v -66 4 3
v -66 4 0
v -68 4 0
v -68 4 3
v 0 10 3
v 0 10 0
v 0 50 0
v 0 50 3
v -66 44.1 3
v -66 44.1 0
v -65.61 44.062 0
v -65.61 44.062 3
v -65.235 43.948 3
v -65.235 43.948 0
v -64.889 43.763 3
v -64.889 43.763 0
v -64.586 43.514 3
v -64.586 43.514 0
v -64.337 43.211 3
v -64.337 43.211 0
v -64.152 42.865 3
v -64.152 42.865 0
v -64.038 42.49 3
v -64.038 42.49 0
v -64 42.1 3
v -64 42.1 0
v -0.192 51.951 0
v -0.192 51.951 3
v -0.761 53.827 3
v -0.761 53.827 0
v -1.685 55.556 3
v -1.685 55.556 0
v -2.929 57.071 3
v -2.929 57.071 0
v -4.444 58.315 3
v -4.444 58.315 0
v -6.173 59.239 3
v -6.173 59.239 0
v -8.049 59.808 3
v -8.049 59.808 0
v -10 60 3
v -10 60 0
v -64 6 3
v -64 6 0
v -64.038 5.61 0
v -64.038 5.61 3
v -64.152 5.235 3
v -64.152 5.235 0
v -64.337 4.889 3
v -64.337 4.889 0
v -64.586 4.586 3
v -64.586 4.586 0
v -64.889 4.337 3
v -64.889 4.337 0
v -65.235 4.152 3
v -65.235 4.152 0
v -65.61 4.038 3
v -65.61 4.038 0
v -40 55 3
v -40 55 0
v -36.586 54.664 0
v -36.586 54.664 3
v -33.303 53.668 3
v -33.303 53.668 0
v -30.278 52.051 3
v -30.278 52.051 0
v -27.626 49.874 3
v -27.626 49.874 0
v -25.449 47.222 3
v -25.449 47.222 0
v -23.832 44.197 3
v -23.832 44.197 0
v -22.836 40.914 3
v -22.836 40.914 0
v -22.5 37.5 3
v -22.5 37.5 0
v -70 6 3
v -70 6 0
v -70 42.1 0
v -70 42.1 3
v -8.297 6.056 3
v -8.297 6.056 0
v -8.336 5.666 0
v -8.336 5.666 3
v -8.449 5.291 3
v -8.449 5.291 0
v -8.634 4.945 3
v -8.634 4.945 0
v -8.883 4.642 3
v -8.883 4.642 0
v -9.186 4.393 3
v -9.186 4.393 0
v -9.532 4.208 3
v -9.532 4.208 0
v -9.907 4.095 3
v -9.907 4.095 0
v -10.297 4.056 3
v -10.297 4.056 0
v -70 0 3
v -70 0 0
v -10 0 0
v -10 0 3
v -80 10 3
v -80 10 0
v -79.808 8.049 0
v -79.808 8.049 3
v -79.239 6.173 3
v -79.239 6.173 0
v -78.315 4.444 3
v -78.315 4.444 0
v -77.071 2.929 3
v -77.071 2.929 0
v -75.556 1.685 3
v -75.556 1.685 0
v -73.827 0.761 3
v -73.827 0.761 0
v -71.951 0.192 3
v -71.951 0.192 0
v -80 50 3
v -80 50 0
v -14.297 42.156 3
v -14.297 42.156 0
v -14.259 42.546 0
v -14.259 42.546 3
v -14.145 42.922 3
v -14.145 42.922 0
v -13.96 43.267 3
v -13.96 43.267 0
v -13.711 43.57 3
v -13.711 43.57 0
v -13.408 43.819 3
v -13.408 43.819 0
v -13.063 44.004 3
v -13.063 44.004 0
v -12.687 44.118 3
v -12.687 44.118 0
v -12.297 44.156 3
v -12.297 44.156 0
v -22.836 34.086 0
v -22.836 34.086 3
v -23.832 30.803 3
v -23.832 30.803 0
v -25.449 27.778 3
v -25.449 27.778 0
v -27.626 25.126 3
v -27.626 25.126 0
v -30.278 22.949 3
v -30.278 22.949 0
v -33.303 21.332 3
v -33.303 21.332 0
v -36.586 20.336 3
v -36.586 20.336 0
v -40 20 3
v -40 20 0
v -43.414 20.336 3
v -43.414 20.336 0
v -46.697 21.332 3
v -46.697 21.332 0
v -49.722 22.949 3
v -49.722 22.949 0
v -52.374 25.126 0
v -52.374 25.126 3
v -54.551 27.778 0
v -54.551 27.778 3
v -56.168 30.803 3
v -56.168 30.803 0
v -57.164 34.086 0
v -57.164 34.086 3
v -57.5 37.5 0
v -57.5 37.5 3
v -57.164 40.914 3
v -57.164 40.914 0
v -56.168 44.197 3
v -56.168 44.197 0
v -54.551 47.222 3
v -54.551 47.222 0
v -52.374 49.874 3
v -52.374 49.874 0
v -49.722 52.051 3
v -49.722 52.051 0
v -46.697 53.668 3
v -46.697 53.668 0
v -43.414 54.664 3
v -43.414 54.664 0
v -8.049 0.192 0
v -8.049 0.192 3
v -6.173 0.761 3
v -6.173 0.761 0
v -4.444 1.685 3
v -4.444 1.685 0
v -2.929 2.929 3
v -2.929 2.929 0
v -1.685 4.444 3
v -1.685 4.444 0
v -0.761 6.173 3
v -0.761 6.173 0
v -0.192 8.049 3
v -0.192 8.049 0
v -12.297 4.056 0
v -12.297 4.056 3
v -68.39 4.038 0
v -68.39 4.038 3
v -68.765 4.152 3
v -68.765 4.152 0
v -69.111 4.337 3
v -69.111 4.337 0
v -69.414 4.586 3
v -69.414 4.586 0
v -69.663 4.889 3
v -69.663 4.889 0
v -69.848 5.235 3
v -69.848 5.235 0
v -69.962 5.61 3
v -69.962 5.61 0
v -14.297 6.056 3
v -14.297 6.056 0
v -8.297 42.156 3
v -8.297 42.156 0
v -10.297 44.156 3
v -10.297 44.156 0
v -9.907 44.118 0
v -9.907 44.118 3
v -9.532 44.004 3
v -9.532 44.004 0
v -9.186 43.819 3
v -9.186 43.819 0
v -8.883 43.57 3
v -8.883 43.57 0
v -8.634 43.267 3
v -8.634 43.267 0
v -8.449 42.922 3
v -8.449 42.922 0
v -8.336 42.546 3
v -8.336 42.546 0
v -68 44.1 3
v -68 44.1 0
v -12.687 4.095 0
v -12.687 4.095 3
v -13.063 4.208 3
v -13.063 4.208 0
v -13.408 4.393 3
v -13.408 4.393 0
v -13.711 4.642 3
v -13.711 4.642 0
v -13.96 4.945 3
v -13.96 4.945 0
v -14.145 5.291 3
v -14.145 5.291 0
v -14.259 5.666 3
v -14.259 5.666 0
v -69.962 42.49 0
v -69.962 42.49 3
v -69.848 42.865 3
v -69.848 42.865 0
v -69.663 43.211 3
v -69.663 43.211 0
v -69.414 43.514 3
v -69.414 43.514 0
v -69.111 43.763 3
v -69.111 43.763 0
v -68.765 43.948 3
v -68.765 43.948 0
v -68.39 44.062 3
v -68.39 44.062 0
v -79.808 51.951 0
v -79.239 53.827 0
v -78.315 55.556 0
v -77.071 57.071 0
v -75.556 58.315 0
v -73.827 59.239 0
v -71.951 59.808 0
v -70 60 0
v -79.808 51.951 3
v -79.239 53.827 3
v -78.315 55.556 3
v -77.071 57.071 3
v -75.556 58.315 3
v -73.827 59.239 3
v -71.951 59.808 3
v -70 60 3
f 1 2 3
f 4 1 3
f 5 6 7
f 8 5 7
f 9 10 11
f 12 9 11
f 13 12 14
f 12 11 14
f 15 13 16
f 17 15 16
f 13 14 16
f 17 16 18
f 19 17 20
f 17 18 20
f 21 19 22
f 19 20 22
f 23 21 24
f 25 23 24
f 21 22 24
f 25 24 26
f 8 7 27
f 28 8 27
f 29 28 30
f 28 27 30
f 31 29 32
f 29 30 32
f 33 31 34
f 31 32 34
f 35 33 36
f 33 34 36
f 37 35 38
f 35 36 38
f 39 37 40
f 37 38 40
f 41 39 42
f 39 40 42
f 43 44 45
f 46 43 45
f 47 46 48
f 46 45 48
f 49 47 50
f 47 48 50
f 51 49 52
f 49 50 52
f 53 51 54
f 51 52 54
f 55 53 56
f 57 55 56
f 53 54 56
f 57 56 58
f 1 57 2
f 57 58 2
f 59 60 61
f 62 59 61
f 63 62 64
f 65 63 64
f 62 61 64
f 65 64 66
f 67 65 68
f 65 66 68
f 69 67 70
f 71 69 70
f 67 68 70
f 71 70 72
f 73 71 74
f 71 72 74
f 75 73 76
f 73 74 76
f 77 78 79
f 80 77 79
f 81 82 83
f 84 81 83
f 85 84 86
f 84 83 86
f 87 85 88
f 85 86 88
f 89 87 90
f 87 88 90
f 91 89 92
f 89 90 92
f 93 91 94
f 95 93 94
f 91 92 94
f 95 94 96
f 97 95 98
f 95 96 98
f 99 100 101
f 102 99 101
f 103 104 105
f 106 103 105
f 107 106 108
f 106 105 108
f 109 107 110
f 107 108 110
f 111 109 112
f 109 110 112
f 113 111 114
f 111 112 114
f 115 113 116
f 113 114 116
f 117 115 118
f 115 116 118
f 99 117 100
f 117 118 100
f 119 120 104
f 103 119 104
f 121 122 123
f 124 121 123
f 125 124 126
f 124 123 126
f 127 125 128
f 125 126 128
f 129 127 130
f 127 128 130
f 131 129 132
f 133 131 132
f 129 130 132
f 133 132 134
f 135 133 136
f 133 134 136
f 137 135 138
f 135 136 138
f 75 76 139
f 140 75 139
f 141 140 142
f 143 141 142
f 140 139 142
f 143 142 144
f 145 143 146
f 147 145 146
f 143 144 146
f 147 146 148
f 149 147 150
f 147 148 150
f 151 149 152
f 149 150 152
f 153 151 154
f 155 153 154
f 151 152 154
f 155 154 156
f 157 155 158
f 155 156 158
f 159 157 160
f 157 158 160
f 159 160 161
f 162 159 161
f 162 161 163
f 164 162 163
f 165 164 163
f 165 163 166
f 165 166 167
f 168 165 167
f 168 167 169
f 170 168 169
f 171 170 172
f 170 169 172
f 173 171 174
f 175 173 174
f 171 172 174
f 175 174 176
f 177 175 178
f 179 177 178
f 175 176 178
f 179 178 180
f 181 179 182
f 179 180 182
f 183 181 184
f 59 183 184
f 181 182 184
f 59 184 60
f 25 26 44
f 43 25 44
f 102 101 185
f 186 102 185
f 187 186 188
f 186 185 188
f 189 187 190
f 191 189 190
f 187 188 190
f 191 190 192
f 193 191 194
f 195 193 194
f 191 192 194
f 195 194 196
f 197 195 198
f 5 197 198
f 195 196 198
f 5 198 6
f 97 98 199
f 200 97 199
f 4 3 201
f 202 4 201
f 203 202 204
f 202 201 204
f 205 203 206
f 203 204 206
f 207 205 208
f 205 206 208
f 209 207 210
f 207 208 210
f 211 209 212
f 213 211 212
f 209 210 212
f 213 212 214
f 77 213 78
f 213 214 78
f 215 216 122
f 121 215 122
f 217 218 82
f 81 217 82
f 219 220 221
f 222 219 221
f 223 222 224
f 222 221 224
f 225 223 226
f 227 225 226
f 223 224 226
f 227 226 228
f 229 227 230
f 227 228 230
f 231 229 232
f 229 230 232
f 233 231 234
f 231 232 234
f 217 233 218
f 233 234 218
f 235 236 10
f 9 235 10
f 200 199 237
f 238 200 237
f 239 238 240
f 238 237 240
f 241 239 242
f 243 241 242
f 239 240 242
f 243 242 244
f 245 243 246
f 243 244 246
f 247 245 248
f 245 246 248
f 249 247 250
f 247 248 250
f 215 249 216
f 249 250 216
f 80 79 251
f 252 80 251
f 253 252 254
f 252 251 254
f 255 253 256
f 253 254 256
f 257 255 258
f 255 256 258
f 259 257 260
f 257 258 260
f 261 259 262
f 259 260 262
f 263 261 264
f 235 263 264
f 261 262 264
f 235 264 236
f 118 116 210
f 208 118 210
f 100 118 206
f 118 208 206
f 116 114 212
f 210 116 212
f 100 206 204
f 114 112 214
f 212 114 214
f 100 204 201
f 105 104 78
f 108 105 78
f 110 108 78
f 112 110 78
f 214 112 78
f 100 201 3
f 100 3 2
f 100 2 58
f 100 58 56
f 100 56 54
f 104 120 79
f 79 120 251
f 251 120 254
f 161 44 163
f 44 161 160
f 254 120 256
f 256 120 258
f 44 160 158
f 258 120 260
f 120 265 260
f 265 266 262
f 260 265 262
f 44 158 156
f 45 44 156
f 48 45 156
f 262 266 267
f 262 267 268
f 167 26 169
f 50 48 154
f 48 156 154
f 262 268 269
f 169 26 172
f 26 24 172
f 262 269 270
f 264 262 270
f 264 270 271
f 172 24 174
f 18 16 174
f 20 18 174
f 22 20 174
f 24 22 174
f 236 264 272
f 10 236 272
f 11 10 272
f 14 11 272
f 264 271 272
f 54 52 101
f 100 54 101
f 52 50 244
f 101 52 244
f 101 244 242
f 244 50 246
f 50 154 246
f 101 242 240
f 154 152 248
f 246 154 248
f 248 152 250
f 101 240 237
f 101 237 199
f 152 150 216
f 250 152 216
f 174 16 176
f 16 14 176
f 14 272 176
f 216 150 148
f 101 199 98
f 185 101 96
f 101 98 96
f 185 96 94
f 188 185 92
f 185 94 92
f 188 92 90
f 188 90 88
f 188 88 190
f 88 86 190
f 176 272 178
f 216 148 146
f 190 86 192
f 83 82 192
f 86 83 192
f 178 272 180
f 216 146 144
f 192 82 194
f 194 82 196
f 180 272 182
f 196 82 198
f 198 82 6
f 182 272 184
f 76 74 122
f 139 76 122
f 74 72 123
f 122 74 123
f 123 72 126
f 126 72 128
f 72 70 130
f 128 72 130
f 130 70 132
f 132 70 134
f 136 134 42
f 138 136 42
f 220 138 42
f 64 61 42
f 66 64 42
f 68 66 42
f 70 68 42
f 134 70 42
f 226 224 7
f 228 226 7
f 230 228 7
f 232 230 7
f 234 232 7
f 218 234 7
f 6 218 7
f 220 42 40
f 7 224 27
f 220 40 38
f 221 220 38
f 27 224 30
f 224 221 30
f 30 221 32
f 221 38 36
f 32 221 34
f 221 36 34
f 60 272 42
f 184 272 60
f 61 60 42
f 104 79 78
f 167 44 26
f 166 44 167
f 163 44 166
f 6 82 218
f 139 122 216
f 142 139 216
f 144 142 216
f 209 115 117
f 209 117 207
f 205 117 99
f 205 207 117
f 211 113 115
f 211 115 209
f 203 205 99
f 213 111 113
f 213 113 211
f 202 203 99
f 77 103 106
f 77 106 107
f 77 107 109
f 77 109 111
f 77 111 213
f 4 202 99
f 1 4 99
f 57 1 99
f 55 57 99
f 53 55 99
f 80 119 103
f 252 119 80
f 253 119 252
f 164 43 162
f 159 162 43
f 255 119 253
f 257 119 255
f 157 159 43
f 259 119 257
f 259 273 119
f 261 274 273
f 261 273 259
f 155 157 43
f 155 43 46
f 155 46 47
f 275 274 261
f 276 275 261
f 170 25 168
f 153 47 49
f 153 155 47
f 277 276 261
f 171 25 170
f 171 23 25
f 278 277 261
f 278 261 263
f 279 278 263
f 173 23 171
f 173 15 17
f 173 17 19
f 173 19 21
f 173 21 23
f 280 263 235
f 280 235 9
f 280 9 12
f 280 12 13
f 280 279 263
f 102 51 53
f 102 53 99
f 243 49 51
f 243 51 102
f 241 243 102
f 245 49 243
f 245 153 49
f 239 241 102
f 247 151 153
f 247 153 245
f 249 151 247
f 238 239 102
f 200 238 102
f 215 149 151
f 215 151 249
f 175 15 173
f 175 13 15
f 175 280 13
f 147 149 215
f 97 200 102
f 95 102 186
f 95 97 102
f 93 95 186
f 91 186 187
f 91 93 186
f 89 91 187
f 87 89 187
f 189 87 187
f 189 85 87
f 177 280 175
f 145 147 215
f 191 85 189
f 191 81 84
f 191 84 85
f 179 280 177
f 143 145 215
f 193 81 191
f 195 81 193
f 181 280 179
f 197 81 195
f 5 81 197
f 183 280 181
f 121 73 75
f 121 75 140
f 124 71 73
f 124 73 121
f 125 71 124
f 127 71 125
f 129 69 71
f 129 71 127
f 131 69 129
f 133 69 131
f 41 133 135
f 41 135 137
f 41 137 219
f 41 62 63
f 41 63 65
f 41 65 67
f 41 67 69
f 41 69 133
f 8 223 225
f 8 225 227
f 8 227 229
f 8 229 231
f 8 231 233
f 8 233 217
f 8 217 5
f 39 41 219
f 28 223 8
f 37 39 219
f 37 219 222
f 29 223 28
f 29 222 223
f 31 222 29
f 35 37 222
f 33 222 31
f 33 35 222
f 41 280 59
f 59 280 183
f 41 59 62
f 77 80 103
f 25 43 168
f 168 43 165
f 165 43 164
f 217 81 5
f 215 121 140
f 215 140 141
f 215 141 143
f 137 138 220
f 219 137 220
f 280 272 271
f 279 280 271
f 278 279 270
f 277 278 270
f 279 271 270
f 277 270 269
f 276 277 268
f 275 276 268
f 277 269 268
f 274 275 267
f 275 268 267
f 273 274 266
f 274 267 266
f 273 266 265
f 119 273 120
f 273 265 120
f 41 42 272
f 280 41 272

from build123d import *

# Parameters (mm, degrees)
F1_DEPTH = 3


with BuildPart() as f1:
    # F0 (on Top) → F1 (new body)
    with BuildSketch(Plane.XY):
        with BuildLine():
            Line((-67.040354, 0), (-10, 0))
            ThreePointArc((-10, 0), (-2.928932, 2.928932), (0, 10))
            Line((0, 10), (0, 30))
            Line((0, 30), (0, 50))
            ThreePointArc((0, 50), (-2.928932, 57.071068), (-10, 60))
            Line((-10, 60), (-40, 60))
            Line((-40, 60), (-70, 60))
            ThreePointArc((-70, 60), (-77.071068, 57.071068), (-80, 50))
            Line((-80, 50), (-80, 36.222443))
            Line((-80, 36.222443), (-80, 10))
            ThreePointArc((-80, 10), (-77.071068, 2.928932), (-70, 0))
            Line((-70, 0), (-67.040354, 0))
        make_face()
        with BuildLine():
            Line((-66, 4), (-67.040354, 4))
            Line((-67.040354, 4), (-68, 4))
            ThreePointArc((-68, 4), (-69.414214, 4.585786), (-70, 6))
            Line((-70, 6), (-70, 42.1))
            ThreePointArc((-70, 42.1), (-69.414214, 43.514214), (-68, 44.1))
            Line((-68, 44.1), (-66, 44.1))
            ThreePointArc((-66, 44.1), (-64.585786, 43.514214), (-64, 42.1))
            Line((-64, 42.1), (-64, 6))
            ThreePointArc((-64, 6), (-64.585786, 4.585786), (-66, 4))
        make_face(mode=Mode.SUBTRACT)
        with BuildLine():
            Line((-8.297237, 42.15616), (-8.297237, 30))
            Line((-8.297237, 30), (-8.297237, 6.05616))
            ThreePointArc((-8.297237, 6.05616), (-8.883023, 4.641946), (-10.297237, 4.05616))
            Line((-10.297237, 4.05616), (-12.297237, 4.05616))
            ThreePointArc((-12.297237, 4.05616), (-13.71145, 4.641946), (-14.297237, 6.05616))
            Line((-14.297237, 6.05616), (-14.297237, 42.15616))
            ThreePointArc((-14.297237, 42.15616), (-13.71145, 43.570373), (-12.297237, 44.15616))
            Line((-12.297237, 44.15616), (-10.297237, 44.15616))
            ThreePointArc((-10.297237, 44.15616), (-8.883023, 43.570373), (-8.297237, 42.15616))
        make_face(mode=Mode.SUBTRACT)
        with BuildLine():
            ThreePointArc((-22.499999, 37.5), (-52.374367, 25.125631), (-40, 55))
            ThreePointArc((-40, 55), (-27.625631, 49.874369), (-22.499999, 37.5))
        make_face(mode=Mode.SUBTRACT)
    extrude(amount=F1_DEPTH)


solid = f1.part
